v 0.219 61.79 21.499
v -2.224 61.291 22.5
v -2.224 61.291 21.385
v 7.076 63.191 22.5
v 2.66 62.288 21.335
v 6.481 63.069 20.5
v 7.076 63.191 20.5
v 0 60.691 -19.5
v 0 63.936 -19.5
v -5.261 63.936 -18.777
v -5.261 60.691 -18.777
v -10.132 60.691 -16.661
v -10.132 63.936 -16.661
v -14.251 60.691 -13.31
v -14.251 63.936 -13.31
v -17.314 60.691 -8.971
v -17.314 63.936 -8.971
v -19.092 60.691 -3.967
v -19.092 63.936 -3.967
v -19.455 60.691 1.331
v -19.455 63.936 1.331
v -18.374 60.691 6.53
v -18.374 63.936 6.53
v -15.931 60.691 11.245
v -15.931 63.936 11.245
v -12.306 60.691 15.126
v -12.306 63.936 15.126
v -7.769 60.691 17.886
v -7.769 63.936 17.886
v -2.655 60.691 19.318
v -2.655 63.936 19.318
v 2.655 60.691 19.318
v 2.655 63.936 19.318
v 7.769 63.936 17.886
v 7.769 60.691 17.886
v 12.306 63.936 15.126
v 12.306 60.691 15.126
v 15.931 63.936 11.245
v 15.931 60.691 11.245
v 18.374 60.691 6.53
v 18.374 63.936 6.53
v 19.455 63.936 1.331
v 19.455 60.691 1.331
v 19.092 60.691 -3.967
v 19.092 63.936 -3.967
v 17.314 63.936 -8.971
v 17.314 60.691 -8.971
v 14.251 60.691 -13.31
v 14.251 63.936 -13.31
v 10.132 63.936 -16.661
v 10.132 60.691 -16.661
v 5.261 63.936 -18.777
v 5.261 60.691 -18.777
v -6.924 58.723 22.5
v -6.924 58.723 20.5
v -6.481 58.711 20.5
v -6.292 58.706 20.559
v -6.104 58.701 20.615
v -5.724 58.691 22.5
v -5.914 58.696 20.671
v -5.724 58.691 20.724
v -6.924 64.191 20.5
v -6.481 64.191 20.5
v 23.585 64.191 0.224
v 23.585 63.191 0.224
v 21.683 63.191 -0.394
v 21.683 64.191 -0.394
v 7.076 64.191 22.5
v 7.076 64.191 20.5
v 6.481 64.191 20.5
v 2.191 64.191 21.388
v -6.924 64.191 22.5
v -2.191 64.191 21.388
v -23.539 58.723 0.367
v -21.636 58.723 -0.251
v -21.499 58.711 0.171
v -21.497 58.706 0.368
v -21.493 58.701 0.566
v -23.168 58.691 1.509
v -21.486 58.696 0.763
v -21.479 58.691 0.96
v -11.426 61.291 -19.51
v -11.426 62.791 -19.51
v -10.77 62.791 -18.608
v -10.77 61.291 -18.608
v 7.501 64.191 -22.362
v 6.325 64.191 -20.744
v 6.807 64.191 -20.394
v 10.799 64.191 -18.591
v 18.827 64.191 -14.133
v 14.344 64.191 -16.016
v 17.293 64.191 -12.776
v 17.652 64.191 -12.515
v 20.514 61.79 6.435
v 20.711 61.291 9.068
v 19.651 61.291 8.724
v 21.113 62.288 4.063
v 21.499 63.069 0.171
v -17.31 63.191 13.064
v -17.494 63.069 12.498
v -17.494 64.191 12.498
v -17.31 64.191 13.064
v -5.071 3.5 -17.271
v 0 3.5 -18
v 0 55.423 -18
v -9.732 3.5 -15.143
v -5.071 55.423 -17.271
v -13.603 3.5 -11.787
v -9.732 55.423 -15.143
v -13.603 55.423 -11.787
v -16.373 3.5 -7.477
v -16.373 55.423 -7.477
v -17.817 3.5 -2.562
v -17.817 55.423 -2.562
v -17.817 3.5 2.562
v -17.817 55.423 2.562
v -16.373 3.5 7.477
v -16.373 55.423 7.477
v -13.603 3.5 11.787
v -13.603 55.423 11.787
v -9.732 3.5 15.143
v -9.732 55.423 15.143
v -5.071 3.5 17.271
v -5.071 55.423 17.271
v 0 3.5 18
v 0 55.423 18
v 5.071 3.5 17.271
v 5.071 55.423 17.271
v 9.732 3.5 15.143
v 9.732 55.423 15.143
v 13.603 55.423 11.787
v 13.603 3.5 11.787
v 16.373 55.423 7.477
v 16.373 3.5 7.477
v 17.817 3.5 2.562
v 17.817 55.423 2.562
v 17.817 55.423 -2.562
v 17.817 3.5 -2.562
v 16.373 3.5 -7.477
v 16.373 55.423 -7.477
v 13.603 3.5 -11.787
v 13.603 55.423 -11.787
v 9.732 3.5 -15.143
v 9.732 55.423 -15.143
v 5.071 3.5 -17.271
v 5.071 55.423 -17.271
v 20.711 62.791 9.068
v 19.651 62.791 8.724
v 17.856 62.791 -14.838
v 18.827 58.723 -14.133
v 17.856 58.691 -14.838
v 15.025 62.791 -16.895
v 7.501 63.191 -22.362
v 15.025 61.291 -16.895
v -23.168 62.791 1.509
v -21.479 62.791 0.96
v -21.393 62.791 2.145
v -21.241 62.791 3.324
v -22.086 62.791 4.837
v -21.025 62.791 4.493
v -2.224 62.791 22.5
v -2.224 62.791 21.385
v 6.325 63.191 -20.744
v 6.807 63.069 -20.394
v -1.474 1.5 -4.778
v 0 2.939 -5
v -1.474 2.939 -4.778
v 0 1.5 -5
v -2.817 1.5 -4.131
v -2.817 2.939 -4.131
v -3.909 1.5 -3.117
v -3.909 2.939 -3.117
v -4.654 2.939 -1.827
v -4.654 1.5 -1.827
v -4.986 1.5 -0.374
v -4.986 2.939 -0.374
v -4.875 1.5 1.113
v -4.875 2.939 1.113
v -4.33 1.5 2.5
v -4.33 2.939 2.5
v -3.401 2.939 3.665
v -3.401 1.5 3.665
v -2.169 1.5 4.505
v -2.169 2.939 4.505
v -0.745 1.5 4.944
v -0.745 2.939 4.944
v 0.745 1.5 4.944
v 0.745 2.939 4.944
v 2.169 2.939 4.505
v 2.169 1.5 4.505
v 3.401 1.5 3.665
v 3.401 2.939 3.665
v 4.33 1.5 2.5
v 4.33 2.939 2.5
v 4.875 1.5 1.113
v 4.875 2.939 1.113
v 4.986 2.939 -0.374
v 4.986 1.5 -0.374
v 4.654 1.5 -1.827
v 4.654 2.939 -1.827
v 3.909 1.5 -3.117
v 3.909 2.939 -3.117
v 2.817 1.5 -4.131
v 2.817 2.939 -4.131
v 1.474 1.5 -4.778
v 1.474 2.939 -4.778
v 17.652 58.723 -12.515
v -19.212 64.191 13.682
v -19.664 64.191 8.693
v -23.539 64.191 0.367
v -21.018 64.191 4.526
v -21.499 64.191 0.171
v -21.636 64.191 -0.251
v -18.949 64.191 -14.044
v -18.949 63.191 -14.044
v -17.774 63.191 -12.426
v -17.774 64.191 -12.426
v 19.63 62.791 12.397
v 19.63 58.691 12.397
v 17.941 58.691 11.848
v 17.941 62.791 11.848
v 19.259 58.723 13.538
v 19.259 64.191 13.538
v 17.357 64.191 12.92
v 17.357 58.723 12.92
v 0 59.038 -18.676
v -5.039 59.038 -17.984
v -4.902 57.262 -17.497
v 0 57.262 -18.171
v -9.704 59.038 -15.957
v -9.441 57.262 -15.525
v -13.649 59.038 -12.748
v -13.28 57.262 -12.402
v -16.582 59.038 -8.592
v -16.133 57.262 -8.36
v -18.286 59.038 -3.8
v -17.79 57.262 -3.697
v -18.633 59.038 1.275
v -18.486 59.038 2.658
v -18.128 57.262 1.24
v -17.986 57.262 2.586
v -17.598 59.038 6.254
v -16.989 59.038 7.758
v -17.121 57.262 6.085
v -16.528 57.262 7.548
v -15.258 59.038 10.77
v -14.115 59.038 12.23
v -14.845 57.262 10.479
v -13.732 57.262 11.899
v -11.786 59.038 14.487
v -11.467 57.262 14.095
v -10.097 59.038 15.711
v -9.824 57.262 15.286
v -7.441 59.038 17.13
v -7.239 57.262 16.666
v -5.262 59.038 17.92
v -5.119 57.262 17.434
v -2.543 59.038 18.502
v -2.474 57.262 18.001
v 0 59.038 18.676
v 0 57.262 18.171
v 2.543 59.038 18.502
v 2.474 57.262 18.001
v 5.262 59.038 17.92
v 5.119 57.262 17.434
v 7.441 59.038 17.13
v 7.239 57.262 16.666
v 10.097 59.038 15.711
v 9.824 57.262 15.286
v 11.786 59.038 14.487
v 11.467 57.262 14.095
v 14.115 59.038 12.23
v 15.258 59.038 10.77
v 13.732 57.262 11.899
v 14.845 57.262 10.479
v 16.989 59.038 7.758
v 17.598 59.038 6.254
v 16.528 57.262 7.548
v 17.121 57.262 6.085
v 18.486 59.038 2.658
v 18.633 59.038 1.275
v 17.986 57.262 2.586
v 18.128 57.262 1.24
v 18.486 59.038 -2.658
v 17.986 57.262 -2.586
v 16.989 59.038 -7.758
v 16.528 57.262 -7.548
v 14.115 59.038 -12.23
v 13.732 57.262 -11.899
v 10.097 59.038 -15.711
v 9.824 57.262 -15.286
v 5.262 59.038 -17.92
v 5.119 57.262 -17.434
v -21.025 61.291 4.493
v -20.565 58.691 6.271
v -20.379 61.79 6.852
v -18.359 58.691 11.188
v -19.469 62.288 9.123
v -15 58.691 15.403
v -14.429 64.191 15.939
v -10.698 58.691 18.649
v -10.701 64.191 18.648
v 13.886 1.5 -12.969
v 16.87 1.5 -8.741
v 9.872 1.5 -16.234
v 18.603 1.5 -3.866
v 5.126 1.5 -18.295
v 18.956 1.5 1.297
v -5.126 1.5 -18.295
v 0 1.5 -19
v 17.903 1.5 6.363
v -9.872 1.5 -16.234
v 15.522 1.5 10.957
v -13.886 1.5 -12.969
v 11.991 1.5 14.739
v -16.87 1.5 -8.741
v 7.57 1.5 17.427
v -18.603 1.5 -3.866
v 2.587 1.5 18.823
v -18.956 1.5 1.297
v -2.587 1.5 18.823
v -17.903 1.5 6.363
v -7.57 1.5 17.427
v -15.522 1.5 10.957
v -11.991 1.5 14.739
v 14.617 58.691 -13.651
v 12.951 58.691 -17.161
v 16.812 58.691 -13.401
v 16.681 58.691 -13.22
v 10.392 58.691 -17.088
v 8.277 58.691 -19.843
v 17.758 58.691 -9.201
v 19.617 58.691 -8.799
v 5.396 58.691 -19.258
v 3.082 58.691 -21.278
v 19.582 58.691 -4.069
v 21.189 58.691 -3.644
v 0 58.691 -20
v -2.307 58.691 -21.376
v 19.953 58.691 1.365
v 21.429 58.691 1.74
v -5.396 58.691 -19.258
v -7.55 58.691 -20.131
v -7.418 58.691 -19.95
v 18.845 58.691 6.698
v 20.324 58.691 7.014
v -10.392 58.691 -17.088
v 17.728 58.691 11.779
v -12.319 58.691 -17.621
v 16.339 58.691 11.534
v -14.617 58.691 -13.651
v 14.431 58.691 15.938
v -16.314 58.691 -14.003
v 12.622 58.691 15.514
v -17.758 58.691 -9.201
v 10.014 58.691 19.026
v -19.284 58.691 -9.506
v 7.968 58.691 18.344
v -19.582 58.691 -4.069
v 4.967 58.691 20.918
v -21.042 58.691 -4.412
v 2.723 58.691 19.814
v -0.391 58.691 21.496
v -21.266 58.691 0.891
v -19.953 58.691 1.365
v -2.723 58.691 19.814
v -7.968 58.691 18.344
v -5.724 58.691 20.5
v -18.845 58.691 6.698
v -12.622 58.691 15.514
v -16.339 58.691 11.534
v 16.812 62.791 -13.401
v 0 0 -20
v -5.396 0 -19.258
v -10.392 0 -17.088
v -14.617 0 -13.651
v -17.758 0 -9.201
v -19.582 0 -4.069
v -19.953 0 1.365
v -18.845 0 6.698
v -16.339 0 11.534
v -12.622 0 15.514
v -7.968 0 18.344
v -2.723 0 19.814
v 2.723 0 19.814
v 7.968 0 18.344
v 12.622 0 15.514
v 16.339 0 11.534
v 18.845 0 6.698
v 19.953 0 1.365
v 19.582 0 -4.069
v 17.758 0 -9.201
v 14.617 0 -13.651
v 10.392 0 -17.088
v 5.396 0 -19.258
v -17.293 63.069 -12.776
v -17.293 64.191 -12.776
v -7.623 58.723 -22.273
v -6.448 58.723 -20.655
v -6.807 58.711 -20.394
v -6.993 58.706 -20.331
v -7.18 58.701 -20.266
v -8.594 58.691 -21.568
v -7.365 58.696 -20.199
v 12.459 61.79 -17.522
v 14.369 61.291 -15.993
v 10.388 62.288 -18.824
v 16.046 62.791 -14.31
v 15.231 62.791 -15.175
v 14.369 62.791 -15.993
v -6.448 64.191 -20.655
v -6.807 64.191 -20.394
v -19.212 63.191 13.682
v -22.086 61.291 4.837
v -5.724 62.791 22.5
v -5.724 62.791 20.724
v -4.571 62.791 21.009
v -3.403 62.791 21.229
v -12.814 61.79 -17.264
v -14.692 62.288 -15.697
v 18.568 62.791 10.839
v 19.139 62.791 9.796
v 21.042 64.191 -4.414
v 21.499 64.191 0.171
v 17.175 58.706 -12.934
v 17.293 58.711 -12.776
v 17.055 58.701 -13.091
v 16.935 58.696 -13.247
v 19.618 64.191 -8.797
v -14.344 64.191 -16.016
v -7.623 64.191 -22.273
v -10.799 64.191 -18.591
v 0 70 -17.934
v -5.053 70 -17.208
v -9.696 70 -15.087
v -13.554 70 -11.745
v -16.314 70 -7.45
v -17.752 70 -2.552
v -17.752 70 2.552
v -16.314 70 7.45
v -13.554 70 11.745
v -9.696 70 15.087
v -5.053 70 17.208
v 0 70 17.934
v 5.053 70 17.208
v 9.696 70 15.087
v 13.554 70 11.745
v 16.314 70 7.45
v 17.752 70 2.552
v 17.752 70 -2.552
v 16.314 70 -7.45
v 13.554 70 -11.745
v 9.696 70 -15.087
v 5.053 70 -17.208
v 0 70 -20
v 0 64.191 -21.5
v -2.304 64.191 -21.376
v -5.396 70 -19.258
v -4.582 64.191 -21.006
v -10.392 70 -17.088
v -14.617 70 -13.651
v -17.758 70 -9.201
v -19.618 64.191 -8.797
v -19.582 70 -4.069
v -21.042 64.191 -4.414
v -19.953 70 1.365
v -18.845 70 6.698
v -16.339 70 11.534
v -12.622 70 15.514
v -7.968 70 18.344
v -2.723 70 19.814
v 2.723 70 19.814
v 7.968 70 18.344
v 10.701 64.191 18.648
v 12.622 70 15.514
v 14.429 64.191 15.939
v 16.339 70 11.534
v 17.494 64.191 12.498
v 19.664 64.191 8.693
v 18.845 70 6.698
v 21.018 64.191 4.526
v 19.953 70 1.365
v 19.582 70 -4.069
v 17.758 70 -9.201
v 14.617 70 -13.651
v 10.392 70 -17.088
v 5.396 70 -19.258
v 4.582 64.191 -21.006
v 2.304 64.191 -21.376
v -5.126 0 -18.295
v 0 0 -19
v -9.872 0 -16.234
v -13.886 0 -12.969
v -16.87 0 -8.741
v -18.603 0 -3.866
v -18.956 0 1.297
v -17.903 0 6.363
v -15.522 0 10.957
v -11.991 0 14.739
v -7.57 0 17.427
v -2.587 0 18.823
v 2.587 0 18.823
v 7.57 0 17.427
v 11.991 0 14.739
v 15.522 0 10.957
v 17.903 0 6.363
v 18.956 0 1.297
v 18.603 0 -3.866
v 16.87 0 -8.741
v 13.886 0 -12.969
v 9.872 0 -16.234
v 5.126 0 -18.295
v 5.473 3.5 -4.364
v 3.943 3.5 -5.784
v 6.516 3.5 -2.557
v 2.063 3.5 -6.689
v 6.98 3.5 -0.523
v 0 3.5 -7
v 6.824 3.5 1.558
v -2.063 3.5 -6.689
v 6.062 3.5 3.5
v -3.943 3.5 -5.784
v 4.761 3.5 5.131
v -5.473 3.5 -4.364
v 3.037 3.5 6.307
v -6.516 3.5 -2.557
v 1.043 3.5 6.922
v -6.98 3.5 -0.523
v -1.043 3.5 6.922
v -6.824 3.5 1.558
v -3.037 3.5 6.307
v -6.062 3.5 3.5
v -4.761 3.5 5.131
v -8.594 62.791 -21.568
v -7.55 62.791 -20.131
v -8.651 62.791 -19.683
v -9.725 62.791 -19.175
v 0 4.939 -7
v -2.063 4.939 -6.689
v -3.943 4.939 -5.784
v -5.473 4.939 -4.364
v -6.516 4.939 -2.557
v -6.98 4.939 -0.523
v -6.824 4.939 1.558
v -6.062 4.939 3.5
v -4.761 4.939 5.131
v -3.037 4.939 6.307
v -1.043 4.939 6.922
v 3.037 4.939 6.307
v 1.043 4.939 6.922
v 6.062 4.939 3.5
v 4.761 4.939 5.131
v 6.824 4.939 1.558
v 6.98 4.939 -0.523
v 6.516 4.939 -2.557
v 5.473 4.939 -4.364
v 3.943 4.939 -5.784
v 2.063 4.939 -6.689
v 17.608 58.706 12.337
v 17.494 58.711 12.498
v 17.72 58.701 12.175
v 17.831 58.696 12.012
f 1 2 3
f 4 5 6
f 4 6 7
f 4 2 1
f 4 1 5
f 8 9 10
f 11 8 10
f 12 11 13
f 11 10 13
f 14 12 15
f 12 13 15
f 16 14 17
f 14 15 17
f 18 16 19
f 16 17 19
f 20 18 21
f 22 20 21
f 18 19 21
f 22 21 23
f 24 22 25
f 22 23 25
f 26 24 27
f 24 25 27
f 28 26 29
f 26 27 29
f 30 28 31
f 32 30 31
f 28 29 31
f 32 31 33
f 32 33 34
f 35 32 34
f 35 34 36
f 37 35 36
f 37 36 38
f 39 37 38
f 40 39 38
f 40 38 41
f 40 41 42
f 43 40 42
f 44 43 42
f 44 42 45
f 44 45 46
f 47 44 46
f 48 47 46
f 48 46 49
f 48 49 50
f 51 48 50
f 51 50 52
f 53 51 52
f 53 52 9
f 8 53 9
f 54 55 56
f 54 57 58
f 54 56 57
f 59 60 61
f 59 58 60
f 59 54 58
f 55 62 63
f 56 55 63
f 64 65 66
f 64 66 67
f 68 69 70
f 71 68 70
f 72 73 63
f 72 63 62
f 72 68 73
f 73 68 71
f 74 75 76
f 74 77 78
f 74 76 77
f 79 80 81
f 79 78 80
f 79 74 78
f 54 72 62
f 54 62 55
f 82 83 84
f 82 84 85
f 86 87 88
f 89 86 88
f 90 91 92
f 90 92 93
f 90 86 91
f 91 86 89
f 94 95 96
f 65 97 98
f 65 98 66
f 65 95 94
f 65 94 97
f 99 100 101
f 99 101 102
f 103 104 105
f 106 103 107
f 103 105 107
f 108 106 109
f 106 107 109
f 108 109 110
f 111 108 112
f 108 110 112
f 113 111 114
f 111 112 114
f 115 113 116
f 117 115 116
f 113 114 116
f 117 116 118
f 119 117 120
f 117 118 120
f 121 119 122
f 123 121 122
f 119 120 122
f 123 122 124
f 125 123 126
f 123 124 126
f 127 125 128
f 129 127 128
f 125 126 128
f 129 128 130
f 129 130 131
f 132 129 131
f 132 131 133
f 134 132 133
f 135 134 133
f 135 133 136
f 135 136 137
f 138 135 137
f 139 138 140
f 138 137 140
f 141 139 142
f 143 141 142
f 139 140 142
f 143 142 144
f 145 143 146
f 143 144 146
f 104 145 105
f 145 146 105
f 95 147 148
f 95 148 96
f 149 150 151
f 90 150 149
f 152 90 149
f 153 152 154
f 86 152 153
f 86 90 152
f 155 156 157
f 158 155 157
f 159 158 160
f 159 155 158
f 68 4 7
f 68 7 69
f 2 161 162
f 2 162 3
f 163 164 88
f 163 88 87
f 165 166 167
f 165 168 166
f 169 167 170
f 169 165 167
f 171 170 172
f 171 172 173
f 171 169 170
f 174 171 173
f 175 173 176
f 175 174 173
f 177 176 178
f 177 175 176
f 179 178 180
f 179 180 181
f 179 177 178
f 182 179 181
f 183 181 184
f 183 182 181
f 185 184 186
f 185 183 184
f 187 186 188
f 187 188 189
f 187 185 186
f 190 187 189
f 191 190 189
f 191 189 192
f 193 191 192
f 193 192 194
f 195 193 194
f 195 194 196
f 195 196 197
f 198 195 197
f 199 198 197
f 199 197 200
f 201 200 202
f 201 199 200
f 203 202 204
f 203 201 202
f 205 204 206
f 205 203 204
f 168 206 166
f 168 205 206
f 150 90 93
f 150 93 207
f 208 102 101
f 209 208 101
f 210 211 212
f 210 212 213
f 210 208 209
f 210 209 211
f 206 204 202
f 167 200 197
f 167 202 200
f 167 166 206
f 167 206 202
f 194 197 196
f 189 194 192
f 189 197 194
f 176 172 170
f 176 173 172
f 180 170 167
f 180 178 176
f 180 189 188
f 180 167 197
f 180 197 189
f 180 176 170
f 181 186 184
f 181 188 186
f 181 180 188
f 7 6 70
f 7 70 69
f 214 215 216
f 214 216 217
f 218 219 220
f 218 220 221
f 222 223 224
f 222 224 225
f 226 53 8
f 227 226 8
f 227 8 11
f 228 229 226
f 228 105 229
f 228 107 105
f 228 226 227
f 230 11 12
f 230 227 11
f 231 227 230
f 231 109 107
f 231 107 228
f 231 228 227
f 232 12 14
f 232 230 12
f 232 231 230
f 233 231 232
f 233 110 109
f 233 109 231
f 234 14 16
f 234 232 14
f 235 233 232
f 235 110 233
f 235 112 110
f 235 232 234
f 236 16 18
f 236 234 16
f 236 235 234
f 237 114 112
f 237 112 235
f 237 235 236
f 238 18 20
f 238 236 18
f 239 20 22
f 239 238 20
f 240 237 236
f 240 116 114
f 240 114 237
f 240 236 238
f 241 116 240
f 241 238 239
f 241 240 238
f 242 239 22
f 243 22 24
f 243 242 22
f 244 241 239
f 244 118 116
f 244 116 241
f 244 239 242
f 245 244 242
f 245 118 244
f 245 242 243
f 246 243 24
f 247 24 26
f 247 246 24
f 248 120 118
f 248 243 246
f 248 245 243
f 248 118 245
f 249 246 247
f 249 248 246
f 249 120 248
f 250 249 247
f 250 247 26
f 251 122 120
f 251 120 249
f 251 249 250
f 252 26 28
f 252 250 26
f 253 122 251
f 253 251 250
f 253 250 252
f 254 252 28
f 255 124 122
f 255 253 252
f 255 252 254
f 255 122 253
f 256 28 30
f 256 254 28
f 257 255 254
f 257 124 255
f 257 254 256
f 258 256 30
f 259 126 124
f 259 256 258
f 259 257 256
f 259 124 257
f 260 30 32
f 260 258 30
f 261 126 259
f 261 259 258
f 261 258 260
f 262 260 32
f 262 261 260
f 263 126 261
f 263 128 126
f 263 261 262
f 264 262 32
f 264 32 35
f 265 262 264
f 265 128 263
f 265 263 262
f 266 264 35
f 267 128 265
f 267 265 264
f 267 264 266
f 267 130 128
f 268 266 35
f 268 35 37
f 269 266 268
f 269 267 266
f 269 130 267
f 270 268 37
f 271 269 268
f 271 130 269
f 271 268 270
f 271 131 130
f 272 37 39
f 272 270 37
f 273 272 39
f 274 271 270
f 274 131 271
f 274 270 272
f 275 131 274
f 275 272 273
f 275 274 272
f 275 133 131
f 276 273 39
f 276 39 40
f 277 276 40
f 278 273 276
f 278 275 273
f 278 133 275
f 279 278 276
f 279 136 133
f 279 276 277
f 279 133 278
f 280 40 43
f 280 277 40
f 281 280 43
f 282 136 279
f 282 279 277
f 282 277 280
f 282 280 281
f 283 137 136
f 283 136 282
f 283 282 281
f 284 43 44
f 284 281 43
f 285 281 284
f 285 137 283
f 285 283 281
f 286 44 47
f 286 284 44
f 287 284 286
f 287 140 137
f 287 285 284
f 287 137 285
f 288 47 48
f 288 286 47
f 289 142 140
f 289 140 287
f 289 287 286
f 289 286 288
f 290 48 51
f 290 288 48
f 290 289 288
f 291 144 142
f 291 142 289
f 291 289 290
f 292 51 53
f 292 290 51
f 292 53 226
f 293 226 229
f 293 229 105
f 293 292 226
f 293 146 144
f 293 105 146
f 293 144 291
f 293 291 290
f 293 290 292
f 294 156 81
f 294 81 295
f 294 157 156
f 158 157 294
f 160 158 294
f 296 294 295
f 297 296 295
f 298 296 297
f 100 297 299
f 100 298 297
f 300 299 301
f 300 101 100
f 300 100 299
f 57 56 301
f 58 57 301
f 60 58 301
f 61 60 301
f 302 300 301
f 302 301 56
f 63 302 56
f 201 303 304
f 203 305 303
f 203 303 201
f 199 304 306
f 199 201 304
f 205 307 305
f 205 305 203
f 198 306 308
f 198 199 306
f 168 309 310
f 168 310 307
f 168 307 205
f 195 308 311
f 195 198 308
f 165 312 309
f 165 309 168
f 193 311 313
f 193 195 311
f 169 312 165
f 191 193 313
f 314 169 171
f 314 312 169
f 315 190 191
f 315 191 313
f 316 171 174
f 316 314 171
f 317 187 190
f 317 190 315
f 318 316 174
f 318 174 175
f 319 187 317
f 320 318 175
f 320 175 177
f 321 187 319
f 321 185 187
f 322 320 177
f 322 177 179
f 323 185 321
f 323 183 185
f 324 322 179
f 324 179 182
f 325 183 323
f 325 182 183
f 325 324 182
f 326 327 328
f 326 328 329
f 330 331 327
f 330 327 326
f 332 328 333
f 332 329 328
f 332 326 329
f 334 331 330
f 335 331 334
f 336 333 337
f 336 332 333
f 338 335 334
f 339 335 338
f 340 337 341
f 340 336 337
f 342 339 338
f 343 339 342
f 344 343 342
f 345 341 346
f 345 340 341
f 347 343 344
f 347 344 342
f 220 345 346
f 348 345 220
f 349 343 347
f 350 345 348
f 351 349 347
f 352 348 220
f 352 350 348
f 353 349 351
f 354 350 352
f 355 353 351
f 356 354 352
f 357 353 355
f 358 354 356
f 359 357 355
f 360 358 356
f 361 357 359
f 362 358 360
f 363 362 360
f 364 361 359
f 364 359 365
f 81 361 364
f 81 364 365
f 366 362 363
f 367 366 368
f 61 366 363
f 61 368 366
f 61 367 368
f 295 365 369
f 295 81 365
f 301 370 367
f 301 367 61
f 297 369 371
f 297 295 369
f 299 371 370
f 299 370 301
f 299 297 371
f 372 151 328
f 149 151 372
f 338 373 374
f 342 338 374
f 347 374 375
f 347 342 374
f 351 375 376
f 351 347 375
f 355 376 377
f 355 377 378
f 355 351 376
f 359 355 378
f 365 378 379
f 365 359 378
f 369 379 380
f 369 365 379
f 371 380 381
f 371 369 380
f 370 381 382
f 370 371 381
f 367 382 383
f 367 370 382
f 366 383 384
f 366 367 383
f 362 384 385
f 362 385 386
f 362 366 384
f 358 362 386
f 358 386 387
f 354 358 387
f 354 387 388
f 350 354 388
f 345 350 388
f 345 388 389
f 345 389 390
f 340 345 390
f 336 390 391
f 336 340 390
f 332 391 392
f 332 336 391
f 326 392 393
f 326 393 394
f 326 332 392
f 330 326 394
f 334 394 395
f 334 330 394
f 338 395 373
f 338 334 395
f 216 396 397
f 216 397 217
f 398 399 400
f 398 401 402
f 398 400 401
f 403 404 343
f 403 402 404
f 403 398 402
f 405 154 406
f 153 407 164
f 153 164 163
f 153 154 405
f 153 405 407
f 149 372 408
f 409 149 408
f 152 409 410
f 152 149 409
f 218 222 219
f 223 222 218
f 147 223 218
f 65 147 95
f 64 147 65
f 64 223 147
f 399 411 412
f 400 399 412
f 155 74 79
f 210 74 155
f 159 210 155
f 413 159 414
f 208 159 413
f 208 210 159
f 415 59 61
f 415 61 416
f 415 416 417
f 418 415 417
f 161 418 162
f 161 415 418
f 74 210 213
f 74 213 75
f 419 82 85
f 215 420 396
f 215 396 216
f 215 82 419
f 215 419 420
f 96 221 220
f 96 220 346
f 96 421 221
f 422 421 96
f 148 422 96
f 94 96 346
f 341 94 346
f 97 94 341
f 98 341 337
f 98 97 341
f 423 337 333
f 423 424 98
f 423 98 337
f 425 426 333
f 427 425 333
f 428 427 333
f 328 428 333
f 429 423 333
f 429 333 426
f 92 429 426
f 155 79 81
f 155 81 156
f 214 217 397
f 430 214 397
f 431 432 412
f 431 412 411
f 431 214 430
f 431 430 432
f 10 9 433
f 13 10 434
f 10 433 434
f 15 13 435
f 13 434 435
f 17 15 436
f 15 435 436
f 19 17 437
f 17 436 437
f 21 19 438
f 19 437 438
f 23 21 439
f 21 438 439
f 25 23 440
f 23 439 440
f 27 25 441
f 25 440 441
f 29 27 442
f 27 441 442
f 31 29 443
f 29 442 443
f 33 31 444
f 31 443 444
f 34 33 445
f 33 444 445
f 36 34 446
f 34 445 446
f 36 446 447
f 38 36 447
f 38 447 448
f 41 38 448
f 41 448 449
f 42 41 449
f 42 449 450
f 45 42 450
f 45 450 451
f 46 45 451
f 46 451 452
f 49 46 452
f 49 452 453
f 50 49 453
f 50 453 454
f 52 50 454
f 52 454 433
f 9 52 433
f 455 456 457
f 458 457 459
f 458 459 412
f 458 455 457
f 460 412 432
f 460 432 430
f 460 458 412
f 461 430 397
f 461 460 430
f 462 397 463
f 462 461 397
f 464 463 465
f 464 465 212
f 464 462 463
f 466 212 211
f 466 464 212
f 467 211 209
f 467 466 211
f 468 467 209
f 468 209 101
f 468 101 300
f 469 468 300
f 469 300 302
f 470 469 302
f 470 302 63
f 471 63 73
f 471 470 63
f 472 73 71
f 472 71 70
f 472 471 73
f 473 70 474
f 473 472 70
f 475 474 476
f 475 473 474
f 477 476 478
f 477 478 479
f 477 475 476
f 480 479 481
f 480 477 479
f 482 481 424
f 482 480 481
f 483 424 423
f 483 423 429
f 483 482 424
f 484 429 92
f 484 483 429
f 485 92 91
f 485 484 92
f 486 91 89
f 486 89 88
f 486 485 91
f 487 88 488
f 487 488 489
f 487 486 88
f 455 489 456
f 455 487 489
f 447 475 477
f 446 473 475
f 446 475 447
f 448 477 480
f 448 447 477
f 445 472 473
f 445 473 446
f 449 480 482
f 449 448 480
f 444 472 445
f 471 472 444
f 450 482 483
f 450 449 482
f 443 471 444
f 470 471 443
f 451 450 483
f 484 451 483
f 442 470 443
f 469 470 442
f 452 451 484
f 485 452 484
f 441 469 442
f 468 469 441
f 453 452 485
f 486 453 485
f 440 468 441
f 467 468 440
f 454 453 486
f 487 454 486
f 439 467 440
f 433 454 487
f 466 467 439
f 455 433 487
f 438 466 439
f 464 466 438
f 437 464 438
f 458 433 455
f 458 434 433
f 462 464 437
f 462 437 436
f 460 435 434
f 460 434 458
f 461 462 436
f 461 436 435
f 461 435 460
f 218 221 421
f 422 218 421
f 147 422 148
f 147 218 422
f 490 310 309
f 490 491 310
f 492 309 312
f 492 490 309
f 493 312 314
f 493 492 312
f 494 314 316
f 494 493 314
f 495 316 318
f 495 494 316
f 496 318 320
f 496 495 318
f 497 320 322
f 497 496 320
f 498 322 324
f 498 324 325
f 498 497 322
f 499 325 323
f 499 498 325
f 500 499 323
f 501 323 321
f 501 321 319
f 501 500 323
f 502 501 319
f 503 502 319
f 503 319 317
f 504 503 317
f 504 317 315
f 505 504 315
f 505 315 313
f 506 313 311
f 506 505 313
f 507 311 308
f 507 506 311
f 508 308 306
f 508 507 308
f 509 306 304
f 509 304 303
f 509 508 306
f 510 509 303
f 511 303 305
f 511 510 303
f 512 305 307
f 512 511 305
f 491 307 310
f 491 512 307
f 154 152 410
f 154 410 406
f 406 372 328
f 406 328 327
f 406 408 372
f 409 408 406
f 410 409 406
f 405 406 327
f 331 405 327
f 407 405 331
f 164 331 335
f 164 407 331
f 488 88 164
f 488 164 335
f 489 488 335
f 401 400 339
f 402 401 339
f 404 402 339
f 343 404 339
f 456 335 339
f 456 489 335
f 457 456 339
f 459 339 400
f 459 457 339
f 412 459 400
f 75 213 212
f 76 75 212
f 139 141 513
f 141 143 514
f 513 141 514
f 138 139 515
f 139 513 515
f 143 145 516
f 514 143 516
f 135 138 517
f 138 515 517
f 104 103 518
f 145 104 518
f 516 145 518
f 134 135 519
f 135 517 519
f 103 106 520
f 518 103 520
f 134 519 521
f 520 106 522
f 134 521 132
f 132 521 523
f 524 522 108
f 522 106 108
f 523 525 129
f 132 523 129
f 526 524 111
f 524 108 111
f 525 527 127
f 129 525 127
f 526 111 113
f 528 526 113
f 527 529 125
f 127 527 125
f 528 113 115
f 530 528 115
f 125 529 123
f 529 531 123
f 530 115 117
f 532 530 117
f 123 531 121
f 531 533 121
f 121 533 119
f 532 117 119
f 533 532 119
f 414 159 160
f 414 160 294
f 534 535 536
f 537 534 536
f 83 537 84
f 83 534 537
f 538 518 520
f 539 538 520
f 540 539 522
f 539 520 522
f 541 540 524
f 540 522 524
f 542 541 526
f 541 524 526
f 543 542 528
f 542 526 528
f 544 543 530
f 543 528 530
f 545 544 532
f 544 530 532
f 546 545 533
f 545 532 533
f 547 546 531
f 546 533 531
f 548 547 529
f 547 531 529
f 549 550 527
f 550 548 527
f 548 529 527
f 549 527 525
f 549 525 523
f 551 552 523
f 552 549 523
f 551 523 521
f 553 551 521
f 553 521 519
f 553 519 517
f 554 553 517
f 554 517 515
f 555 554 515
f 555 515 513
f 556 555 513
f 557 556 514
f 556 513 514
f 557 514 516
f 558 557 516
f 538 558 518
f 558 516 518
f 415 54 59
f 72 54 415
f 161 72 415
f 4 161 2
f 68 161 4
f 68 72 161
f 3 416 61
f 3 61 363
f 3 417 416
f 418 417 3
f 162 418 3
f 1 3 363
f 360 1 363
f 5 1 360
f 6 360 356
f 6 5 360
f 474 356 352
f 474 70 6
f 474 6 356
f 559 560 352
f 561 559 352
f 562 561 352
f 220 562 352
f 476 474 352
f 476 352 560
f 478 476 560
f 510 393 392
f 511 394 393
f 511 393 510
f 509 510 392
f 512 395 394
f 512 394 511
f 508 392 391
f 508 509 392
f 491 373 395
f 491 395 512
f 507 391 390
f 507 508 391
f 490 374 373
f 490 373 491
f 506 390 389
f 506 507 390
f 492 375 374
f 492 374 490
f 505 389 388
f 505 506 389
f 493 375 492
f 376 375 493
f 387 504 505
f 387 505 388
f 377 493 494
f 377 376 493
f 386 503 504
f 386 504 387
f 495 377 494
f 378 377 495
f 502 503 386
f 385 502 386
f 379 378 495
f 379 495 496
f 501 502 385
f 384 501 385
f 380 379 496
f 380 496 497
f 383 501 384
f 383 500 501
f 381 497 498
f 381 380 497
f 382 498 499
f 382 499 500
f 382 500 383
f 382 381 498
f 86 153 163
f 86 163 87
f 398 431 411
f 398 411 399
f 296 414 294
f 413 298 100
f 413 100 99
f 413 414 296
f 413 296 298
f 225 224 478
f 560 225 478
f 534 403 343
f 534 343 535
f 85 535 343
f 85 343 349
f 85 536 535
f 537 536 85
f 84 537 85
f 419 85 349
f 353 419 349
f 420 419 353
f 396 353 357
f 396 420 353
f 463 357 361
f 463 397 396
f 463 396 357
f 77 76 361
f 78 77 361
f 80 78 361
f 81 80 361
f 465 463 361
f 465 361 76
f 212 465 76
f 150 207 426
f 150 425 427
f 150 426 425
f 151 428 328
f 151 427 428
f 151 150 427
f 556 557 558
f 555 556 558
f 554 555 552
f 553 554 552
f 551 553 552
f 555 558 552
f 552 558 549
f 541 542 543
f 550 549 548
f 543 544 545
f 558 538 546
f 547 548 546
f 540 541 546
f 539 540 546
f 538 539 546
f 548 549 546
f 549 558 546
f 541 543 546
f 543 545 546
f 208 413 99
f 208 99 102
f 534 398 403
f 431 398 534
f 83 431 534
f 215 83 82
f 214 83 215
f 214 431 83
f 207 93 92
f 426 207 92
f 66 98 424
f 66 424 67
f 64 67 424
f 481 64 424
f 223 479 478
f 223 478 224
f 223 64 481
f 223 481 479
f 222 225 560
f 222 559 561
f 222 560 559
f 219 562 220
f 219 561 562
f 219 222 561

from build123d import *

# Parameters (mm, degrees)
SHELL5_T            = -2
FILLET1_R           = 10
BOSS_EXTRUDE1_DEPTH = 1
CIRPATTERN1_COUNT   = 5


with BuildPart() as part:
    # Sketch1 → Revolve1 (revolve)
    with BuildSketch(Plane.XY, mode=Mode.PRIVATE) as revolve1_sk:
        Polygon((20, 0), (20, 58.690524981), (21.5, 58.690524981), (21.5, 64.190524981), (20, 70), (0, 70), (0, 2.938550041), (5, 2.938550041), (5, 1.5), (19, 1.5), (19, 0), align=None)
    revolve(revolve1_sk.sketch.rotate(Axis((0, 0, 0), (0, 1, 0)), 90), axis=Axis((0, 0, 0), (0, 1, 0)))

    # Shell5
    shell5_openings = [part.faces().sort_by_distance(p)[0] for p in [
        (0, 70, 0),
    ]]
    offset(amount=SHELL5_T, openings=shell5_openings, kind=Kind.INTERSECTION)

    # Fillet1
    # the kernel refuses this fillet: 10 mm, written as the material it takes off along each edge
    with BuildSketch(Plane(origin=(0, 60.690524981, 0), x_dir=(0, 0, -1), z_dir=(1, 0, 0))) as fillet1_piece_1:
        with BuildLine():
            CenterArc((28, -5.267826876), FILLET1_R, 148.211669383, 31.788330617)
            Line((19.5, 0), (19.33, 0.105356538))
            ThreePointArc((19.33, 0.105356538), (18.75, 0.2), (18, 0.2))
            Line((18, 0.2), (17.8, 0))
            Line((17.8, 0), (17.8, -5.267826876))
            Line((17.8, -5.267826876), (18, -5.267826876))
        make_face()
    revolve(axis=Axis((0, 60.690524981, 0), (0, 1, 0)), mode=Mode.SUBTRACT)

    # Sketch4 → Boss-Extrude1 (add, symmetric)
    with BuildSketch(Plane.XY.offset(21.5)):
        Polygon((-2.224405673, 61.290524981), (7.075594327, 63.190524981), (7.075594327, 64.190524981), (-6.924405673, 64.190524981), (-6.924405673, 58.723404538), (-5.724405673, 58.690524981), (-5.724405673, 62.790524981), (-2.224405673, 62.790524981), align=None)
    boss_extrude1 = extrude(amount=BOSS_EXTRUDE1_DEPTH, both=True)

    # CirPattern1: Boss-Extrude1 ×5 about axis
    cirpattern1_axis = Axis((0, 0, 0), (0, 1, 0))
    for i in range(1, CIRPATTERN1_COUNT):
        add(boss_extrude1.rotate(cirpattern1_axis, i * 360 / CIRPATTERN1_COUNT))


solid = part.part
